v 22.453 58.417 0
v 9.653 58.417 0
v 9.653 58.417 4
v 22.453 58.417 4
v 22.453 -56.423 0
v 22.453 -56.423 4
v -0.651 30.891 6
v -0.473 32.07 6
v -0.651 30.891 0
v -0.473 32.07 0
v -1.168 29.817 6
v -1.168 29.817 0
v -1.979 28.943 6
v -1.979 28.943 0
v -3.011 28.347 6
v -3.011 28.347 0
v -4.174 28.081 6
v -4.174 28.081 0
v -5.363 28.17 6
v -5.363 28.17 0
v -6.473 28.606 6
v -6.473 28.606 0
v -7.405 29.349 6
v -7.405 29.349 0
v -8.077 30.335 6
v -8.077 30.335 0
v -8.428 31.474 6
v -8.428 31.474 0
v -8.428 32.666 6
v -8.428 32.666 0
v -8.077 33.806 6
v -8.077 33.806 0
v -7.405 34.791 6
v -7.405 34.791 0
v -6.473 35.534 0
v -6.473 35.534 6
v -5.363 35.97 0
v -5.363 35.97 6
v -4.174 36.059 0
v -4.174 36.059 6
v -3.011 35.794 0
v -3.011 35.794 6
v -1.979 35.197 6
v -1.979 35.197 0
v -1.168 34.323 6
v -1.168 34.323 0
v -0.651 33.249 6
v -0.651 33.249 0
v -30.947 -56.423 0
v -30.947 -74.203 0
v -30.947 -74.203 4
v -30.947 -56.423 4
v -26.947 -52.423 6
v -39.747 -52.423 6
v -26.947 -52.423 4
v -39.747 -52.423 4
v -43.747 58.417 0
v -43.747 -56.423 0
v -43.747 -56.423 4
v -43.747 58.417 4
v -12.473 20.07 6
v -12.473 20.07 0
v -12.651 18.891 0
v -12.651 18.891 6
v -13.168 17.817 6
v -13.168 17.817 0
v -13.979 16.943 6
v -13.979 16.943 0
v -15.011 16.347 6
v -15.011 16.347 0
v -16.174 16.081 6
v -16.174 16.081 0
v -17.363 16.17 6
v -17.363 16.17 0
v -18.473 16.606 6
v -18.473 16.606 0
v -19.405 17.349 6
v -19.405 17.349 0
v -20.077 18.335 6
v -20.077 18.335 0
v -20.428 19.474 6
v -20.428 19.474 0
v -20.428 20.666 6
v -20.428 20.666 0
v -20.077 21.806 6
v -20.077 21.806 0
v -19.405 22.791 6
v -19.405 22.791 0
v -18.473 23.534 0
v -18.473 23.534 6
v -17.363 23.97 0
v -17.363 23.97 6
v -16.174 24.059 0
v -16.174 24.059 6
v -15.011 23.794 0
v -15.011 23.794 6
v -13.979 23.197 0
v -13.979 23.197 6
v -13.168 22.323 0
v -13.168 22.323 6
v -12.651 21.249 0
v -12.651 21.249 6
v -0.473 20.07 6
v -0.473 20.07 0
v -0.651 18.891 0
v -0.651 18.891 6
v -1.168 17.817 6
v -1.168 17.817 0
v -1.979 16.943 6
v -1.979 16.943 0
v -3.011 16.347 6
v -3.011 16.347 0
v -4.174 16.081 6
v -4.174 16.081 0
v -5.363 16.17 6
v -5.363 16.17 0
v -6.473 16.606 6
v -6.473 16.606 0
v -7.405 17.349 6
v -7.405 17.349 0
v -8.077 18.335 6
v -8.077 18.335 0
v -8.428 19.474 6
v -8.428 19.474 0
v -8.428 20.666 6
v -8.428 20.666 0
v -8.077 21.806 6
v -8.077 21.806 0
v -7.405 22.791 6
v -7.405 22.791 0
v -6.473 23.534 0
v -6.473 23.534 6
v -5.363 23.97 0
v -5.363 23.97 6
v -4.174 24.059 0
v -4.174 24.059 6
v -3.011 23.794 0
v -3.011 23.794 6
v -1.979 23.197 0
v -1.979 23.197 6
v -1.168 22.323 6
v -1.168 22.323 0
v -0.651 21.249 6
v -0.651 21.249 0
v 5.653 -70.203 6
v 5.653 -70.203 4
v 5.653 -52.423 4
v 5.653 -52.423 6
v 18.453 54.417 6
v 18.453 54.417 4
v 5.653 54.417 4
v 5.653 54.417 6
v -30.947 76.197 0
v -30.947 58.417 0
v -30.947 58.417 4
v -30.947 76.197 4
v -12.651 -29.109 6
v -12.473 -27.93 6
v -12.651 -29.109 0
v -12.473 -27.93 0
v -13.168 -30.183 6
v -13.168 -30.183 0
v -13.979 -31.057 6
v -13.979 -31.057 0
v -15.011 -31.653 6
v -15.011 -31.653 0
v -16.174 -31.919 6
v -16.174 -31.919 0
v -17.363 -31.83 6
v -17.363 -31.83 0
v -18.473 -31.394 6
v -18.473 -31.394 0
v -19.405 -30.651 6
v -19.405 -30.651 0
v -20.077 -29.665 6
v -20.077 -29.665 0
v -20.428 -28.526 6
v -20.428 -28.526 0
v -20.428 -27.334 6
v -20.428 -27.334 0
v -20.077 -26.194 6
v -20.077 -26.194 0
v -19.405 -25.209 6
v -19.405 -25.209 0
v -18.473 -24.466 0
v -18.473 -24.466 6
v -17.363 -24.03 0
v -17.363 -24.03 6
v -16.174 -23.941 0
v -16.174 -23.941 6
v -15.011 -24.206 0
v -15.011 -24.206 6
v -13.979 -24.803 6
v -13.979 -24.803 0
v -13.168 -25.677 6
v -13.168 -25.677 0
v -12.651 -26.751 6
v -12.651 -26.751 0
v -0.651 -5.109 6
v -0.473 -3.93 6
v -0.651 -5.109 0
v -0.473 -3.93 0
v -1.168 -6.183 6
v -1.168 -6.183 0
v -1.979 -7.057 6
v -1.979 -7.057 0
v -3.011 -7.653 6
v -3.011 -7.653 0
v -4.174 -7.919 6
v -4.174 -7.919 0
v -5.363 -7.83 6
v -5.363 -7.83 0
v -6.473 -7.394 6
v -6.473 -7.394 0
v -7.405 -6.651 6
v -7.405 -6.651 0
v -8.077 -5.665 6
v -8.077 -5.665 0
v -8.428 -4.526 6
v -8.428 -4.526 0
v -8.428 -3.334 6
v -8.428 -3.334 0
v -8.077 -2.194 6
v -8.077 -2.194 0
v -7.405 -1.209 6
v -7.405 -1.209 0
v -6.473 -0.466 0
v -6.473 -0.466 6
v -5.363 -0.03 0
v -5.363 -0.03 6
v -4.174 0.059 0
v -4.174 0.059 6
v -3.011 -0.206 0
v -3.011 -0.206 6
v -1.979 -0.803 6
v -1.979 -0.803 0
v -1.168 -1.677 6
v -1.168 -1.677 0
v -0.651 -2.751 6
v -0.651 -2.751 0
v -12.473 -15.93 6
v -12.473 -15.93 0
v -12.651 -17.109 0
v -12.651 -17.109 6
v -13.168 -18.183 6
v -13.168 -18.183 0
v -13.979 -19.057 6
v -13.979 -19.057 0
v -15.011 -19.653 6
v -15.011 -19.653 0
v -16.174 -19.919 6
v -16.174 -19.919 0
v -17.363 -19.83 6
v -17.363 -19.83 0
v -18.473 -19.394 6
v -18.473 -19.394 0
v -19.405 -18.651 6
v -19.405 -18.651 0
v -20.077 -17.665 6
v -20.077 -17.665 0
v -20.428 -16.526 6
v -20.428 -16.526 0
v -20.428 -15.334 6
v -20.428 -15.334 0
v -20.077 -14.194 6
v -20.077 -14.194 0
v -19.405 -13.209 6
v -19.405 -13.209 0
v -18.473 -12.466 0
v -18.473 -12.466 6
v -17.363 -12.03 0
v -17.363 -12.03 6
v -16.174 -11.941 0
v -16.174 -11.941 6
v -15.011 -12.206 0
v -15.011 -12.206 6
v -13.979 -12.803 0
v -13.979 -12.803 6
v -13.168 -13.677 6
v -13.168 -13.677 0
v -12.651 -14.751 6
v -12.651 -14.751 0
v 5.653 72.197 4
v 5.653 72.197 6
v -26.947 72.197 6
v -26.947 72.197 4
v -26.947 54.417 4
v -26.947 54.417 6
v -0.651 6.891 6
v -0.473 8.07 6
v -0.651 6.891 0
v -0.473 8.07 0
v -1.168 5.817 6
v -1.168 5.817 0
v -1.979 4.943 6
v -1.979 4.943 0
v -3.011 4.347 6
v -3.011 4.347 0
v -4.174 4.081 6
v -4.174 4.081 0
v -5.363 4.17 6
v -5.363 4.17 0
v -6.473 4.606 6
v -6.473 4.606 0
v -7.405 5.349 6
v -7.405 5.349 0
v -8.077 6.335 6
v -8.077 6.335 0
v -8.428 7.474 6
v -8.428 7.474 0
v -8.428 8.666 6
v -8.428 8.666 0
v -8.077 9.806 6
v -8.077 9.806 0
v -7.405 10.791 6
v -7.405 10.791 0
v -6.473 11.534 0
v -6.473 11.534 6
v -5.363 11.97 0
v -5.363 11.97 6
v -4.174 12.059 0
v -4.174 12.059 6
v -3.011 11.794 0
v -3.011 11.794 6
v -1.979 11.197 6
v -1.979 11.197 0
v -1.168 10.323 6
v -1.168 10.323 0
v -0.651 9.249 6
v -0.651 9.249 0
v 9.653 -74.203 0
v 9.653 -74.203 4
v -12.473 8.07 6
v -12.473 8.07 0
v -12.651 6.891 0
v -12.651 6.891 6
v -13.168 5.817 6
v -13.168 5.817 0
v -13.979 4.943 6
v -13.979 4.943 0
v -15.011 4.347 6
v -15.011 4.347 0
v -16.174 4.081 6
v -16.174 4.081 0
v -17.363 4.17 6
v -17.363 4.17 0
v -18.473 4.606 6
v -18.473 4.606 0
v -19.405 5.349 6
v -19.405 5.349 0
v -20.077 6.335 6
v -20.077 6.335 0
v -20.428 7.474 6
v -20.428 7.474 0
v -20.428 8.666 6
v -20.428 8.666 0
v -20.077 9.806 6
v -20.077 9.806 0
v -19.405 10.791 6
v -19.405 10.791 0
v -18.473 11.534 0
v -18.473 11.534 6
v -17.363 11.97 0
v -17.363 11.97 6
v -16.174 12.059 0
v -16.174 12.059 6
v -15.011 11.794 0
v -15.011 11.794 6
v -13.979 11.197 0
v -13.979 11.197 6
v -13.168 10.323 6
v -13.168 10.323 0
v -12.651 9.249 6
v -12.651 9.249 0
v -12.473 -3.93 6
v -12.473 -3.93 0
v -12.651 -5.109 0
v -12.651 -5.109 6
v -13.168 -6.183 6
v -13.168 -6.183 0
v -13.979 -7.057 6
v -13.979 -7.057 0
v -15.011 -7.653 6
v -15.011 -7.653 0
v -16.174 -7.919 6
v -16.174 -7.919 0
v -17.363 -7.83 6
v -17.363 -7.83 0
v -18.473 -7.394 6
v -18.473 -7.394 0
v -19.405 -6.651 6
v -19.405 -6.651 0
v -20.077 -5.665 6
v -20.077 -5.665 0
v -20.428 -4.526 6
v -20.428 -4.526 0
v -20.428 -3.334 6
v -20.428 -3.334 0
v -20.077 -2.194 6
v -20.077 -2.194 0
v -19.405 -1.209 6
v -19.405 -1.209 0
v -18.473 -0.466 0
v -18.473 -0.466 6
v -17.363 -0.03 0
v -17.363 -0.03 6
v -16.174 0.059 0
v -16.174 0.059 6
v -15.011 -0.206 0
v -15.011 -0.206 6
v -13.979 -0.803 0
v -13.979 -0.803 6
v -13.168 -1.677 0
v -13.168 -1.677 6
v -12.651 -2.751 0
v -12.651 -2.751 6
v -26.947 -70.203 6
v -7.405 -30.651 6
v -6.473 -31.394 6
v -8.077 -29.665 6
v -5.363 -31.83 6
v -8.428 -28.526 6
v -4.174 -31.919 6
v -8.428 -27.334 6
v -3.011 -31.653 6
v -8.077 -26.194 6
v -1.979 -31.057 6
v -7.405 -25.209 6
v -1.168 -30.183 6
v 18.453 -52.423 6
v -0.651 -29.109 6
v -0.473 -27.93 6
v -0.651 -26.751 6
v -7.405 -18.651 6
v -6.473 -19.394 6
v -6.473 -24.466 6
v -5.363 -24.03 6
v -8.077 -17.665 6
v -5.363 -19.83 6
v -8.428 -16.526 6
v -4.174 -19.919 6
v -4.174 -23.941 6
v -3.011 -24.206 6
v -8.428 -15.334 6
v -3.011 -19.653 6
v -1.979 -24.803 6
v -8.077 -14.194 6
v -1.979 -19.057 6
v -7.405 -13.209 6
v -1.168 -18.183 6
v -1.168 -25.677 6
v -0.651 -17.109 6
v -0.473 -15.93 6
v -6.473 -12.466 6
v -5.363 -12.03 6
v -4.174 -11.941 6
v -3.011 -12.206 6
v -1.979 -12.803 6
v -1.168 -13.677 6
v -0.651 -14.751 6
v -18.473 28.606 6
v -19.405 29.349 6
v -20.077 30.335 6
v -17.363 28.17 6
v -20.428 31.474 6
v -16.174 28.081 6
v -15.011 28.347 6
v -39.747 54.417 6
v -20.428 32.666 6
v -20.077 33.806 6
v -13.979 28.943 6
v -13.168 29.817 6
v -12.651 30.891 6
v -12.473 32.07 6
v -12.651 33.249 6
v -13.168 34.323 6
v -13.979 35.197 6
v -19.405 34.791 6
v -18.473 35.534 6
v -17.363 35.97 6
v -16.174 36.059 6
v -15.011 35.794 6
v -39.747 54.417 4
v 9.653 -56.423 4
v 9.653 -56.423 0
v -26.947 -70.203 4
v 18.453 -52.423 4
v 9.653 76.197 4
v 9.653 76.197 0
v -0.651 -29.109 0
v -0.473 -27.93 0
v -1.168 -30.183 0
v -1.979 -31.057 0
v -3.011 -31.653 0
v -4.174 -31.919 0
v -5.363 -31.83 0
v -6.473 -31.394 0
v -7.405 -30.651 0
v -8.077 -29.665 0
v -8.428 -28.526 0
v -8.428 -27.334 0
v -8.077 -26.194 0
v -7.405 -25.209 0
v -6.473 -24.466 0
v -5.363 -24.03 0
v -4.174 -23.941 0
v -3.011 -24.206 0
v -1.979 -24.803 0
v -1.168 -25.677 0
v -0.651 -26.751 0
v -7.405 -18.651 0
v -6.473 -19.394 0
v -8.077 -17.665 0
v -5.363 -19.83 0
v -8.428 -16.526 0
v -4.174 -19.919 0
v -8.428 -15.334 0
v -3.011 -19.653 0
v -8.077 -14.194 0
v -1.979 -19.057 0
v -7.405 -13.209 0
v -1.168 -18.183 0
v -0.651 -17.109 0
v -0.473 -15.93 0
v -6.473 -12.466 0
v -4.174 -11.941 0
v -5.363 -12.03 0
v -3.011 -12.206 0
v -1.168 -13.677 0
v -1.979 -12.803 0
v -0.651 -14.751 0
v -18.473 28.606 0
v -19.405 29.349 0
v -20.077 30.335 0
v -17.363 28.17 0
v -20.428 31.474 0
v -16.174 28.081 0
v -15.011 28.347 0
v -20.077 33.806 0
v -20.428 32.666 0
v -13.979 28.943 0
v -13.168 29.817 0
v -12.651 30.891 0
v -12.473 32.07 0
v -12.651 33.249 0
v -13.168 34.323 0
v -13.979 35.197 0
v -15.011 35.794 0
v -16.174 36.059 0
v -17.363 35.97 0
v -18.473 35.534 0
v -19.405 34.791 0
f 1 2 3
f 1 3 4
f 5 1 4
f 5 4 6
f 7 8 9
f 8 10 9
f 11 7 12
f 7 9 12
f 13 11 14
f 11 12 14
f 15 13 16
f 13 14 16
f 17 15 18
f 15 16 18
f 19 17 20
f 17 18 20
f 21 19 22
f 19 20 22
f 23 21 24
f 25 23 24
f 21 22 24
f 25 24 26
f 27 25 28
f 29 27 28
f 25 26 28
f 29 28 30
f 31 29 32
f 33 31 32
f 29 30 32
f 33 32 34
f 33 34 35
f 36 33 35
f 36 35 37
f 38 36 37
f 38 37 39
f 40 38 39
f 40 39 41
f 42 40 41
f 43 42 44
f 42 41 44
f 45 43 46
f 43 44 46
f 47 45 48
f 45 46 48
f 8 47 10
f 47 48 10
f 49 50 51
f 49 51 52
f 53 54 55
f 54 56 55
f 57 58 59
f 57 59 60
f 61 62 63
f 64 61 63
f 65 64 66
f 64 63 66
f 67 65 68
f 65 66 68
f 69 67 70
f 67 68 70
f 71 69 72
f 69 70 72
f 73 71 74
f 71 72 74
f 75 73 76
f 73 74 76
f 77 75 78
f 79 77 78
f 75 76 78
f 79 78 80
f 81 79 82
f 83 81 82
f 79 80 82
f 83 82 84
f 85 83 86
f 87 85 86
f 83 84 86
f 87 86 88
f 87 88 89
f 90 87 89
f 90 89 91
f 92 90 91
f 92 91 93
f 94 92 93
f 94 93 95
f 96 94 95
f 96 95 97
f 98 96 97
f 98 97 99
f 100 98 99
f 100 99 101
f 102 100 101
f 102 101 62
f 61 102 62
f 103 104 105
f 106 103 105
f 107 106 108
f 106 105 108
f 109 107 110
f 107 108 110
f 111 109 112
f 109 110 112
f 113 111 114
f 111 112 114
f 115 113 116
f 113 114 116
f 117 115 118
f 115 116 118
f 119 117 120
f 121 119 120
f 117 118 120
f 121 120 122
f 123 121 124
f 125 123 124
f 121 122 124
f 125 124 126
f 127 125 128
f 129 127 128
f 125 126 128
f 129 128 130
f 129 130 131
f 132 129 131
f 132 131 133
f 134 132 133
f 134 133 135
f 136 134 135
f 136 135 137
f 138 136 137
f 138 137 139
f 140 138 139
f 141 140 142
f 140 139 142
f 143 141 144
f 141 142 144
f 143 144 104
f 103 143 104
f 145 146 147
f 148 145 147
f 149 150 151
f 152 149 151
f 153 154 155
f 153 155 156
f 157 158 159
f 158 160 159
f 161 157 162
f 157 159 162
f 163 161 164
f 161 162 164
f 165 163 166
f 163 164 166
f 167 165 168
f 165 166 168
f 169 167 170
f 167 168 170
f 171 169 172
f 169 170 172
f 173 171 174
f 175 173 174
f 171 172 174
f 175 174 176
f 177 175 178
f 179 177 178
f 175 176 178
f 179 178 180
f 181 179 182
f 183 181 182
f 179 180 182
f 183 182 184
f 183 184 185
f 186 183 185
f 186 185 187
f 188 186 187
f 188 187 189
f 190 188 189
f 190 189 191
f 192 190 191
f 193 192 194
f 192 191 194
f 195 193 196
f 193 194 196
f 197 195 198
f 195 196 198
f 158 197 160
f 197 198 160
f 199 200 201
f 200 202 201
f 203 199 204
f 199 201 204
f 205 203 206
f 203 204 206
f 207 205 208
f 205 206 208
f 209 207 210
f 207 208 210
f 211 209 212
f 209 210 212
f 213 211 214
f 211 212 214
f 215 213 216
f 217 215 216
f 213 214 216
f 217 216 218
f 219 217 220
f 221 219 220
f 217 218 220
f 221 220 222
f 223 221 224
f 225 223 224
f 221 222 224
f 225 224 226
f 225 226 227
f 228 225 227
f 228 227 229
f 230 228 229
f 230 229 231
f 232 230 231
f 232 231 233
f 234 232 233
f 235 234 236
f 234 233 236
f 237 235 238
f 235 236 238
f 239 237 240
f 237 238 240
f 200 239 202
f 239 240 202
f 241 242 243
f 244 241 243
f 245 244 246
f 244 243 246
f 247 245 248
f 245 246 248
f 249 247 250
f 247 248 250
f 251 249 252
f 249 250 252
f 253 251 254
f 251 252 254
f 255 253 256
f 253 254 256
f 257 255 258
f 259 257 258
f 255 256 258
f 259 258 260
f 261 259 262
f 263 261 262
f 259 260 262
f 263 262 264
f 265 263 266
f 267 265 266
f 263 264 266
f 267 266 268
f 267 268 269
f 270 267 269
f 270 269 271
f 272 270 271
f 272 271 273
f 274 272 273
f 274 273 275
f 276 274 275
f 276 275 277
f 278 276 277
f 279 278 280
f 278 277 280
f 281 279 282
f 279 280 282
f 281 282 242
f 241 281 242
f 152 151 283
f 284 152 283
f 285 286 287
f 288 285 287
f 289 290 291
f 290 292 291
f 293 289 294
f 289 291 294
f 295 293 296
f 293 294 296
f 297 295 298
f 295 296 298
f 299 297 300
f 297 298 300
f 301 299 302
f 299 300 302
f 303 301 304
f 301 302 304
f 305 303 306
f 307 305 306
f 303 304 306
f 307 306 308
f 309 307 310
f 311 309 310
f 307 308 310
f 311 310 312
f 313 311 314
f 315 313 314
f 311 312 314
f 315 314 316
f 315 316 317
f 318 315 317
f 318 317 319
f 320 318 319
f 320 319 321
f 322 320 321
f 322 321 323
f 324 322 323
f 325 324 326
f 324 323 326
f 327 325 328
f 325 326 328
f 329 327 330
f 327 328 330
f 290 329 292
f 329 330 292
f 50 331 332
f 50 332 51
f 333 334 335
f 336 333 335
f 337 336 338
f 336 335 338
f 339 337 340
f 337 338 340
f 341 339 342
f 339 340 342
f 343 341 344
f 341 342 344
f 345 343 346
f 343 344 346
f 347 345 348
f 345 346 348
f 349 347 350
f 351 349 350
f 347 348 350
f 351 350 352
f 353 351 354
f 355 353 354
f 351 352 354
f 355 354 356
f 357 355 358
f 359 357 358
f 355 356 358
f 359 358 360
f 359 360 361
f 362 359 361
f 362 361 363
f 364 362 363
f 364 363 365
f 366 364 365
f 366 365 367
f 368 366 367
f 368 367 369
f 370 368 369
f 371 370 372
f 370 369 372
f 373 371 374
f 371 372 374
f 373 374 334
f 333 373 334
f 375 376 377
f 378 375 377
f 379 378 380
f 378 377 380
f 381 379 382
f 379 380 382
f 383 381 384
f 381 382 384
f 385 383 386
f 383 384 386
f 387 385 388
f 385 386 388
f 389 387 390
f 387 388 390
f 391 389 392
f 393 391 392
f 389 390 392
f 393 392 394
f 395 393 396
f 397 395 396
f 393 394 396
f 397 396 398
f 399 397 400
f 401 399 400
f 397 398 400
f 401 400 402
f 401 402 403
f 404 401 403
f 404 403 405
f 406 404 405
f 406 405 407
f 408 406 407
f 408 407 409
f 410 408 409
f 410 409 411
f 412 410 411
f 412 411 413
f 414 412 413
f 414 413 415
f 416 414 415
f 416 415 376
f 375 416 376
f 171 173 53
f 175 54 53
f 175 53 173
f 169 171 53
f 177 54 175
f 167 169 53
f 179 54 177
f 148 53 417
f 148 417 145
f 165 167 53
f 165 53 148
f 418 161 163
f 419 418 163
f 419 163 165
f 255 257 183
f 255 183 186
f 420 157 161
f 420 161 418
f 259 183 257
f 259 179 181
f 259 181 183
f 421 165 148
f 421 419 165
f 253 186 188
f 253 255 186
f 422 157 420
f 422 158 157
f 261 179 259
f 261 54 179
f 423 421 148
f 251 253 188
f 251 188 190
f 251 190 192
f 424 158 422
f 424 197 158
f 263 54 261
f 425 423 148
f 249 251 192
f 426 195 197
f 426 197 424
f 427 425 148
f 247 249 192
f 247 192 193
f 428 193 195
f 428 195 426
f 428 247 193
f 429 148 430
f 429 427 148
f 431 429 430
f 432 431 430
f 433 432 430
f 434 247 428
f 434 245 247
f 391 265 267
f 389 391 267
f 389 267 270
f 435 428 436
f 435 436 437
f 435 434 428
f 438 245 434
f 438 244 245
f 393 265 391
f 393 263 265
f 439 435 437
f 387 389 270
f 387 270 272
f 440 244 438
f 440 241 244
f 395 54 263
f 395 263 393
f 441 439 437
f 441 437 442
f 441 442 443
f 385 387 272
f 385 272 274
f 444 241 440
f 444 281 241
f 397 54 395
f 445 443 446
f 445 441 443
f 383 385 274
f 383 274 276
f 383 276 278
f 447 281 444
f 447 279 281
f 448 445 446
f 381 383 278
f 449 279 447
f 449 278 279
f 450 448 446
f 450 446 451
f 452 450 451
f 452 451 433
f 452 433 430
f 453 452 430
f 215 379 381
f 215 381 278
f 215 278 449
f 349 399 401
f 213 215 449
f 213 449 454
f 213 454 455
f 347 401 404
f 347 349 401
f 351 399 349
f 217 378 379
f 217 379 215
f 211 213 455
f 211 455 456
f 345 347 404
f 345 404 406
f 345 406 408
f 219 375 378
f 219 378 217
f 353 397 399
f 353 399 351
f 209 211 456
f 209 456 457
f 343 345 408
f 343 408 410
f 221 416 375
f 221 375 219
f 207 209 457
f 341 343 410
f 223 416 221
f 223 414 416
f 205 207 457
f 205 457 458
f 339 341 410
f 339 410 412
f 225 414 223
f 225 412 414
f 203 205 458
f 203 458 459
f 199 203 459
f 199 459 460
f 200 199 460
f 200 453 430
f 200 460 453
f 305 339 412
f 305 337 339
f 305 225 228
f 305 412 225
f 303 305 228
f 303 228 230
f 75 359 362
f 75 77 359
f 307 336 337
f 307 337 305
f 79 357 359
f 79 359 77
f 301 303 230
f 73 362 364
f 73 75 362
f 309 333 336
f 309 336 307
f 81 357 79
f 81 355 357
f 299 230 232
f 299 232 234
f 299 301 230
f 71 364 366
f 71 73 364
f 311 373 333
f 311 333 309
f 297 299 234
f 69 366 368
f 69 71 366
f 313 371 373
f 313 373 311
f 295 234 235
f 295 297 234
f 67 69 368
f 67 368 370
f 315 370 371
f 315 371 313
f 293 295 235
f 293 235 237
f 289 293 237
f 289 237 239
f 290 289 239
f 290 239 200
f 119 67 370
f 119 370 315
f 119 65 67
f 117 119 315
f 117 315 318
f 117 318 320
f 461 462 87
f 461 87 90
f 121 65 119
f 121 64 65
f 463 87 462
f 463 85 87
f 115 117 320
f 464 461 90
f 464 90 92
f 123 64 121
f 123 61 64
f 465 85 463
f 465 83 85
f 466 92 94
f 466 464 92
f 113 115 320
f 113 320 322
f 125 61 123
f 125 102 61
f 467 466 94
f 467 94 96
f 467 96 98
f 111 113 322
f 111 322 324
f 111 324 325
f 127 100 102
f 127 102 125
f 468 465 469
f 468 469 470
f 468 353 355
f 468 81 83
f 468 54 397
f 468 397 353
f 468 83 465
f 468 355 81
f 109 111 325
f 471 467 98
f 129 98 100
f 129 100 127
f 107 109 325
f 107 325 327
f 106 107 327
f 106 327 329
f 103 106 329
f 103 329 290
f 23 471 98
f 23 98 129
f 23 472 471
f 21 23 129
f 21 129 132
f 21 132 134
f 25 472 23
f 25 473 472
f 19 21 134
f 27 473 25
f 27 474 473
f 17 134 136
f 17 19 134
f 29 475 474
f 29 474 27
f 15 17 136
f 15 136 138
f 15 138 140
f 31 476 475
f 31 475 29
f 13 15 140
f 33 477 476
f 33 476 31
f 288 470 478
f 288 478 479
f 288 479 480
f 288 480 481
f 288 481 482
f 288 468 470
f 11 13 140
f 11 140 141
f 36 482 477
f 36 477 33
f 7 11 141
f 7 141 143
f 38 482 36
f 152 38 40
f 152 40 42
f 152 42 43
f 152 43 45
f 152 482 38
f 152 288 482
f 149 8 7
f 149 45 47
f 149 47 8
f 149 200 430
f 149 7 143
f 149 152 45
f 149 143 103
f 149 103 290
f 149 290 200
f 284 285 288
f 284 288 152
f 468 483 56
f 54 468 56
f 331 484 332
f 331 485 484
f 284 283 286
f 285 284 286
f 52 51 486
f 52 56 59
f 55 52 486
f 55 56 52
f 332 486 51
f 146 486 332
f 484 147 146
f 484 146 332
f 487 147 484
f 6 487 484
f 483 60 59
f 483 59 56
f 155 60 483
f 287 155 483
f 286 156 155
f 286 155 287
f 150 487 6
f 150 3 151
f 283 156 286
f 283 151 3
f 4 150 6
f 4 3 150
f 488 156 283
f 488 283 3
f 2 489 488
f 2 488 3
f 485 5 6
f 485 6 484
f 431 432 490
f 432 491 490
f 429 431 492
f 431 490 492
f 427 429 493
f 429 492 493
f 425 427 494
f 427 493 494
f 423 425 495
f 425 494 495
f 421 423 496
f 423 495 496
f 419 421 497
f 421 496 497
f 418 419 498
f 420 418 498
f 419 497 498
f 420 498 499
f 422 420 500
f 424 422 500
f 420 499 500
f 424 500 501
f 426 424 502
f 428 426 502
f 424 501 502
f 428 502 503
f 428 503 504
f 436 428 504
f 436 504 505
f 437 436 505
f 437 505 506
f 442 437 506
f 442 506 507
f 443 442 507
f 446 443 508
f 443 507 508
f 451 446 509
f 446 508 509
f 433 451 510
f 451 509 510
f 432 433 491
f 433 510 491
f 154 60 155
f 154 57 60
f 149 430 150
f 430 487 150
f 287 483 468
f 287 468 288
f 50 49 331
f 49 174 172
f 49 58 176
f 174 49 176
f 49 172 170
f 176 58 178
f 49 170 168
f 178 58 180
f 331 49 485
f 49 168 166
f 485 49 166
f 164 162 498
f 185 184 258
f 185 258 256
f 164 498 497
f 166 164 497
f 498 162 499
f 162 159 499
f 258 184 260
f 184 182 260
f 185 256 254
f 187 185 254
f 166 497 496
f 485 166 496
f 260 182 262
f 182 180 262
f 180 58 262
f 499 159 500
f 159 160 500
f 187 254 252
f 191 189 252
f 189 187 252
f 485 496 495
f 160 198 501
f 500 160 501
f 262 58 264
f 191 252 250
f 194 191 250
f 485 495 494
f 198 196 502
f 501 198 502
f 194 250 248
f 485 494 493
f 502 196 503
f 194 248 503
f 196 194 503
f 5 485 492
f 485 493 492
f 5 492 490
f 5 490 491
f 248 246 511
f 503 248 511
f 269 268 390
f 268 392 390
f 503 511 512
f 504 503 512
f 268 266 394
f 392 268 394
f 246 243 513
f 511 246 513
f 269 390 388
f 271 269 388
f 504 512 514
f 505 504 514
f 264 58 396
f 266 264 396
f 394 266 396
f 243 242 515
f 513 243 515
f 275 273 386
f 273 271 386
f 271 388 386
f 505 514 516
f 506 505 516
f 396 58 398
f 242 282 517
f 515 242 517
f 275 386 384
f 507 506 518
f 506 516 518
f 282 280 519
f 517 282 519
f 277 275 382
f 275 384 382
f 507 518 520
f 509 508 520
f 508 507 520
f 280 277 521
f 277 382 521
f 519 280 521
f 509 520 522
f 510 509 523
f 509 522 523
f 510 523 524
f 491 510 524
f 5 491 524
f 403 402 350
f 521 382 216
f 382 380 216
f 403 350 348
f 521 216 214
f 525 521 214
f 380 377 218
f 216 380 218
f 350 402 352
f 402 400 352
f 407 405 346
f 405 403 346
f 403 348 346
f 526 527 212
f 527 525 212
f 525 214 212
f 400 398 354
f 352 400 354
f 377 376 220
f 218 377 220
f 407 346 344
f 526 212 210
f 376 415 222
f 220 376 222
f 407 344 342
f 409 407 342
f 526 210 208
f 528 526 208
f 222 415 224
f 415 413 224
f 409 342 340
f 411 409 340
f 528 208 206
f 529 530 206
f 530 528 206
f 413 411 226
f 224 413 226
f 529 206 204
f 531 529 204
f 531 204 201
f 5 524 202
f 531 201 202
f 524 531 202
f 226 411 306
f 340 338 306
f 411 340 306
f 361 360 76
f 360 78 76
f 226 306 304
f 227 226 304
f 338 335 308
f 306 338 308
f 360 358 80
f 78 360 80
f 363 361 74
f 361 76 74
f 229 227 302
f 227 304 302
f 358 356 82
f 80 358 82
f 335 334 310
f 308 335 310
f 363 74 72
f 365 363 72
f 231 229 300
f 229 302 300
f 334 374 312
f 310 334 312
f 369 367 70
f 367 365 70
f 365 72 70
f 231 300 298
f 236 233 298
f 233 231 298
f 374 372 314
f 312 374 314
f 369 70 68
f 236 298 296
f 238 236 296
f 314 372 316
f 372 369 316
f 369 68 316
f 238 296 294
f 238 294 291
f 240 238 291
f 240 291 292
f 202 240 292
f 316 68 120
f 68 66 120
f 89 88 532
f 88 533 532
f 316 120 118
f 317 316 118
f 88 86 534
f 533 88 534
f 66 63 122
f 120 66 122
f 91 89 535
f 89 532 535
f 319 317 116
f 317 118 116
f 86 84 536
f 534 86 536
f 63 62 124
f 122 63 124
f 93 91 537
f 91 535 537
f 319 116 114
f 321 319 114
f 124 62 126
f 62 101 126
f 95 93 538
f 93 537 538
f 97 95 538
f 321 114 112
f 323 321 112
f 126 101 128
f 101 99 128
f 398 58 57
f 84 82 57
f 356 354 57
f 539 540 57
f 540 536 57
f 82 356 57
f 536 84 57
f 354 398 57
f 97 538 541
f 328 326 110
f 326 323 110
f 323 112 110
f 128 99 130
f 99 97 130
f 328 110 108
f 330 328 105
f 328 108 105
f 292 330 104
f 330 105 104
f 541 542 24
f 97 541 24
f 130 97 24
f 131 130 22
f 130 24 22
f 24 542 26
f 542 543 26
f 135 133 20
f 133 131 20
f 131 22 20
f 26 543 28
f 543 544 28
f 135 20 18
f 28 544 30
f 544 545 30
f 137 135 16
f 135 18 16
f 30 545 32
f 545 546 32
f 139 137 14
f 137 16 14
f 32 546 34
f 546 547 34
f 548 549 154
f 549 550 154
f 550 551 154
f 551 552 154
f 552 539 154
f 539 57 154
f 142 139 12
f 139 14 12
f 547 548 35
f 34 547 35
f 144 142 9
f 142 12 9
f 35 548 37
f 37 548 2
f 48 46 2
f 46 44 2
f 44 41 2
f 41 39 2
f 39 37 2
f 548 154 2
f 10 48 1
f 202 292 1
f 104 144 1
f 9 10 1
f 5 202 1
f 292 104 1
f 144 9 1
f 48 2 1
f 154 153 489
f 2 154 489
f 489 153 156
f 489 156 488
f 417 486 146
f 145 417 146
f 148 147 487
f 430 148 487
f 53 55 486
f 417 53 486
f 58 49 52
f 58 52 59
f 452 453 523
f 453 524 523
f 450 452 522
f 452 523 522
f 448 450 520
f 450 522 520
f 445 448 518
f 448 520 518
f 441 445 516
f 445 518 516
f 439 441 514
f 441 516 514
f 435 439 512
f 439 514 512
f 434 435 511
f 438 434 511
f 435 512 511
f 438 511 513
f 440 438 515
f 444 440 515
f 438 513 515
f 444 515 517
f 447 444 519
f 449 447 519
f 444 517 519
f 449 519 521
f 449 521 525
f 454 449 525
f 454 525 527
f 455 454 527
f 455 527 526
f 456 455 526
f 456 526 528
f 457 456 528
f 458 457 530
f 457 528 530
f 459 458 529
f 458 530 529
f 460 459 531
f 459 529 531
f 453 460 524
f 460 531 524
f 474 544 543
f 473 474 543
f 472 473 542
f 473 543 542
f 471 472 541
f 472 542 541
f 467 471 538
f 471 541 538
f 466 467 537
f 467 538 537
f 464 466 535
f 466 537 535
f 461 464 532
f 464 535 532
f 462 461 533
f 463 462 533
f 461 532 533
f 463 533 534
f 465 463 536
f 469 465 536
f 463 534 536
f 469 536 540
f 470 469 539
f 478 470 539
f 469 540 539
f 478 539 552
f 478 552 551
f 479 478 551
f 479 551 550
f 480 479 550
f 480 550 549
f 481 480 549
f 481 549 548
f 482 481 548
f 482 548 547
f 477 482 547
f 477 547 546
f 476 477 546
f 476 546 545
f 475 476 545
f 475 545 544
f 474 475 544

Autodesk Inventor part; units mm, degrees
ref_plane "YZ Plane" through (0, 0, 0) normal (1, 0, 0) x (0, 1, 0)
ref_plane "XZ Plane" through (0, 0, 0) normal (0, 1, 0) x (-1, 0, 0)
ref_plane "XY Plane" through (0, 0, 0) normal (0, 0, 1) x (1, 0, 0)
sketch "Sketch1" plane through (0, 0, 0) normal (0, 0, 1) x (1, 0, 0)
  line L0 (-39.7468, 54.4174) -> (-39.7468, -52.4226)
  line L1 (-39.7468, -52.4226) -> (-26.9468, -52.4226)
  line L2 (-26.9468, -52.4226) -> (-26.9468, -70.2026)
  line L3 (-26.9468, -70.2026) -> (5.6532, -70.2026)
  line L4 (5.6532, -70.2026) -> (5.6532, -52.4226)
  line L5 (5.6532, -52.4226) -> (18.4532, -52.4226)
  line L6 (18.4532, -52.4226) -> (18.4532, 54.4174)
  line L7 (18.4532, 54.4174) -> (5.6532, 54.4174)
  line L8 (5.6532, 54.4174) -> (5.6532, 72.1974)
  line L9 (5.6532, 72.1974) -> (-26.9468, 72.1974)
  line L10 (-26.9468, 72.1974) -> (-26.9468, 54.4174)
  line L11 (-39.7468, 54.4174) -> (-26.9468, 54.4174)
  line L12 (-23.8279, 76.1974) -> (9.6532, 76.1974)
  line L13 (9.6532, 76.1974) -> (9.6532, 58.4174)
  line L14 (9.6532, 58.4174) -> (22.4532, 58.4174)
  line L15 (22.4532, 58.4174) -> (22.4532, -56.4226)
  line L16 (22.4532, -56.4226) -> (9.6532, -56.4226)
  line L17 (9.6532, -56.4226) -> (9.6532, -74.2026)
  line L18 (9.6532, -74.2026) -> (-30.9468, -74.2026)
  line L19 (-30.9468, -74.2026) -> (-30.9468, -56.4226)
  line L20 (-30.9468, -56.4226) -> (-43.7468, -56.4226)
  line L21 (-43.7468, -56.4226) -> (-43.7468, 58.4174)
  line L22 (-43.7468, 58.4174) -> (-30.9468, 58.4174)
  line L23 (-30.9468, 76.1974) -> (-23.8279, 76.1974)
  line L24 (-30.9468, 58.4174) -> (-30.9468, 76.1974)
  point P0 (0, 0)
  dimension "d0" = 106.84
  dimension "d1" = 142.4
  dimension "d2" = 17.78
  dimension "d3" = 17.78
  dimension "d4" = 32.6
  dimension "d5" = 12.8
  dimension "d6" = 12.8
  dimension "d7" = 4
  dimension "d8" = 4
  dimension "d9" = 4
  dimension "d10" = 4
  dimension "d11" = 4
  dimension "d12" = 4
  dimension "d13" = 4
  dimension "d14" = 4
  dimension "d15" = 4
sketch "Sketch2" plane through (0, 0, 0) normal (0, 0, 1) x (1, 0, 0)
  circle A0 centre (-4.4728, 32.0701) radius 4
  circle A1 centre (-16.4728, 32.0701) radius 4
  circle A2 centre (-4.4728, 20.0701) radius 4
  circle A3 centre (-16.4728, 20.0701) radius 4
  circle A4 centre (-4.4728, 8.0701) radius 4
  circle A5 centre (-16.4728, 8.0701) radius 4
  circle A6 centre (-4.4728, -3.9299) radius 4
  circle A7 centre (-16.4728, -15.9299) radius 4
  circle A8 centre (-4.4728, -15.9299) radius 4
  circle A9 centre (-16.4728, -3.9299) radius 4
  circle A10 centre (-4.4728, -27.9299) radius 4
  circle A11 centre (-16.4728, -27.9299) radius 4
  point P0 (0, 0)
  dimension "d22" = 8
  dimension "d27" = 8
  dimension "d30" = 8
  dimension "d34" = 8
  dimension "d38" = 8
  dimension "d42" = 8
  dimension "d59" = 12
  dimension "d63" = 12
  dimension "d67" = 12
  dimension "d70" = 12
  dimension "d71" = 12
  dimension "d75" = 12
  dimension "d93" = 12
  dimension "d94" = 0
  dimension "d97" = 0
  dimension "d98" = 12
  dimension "d102" = 0
  dimension "d103" = 12
extrude "Extrusion1" add sketch "Sketch1" along normal blind 6 contours L11 L10 L9 L8 L7 L6 L5 L4 L3 L2 L1 L0
extrude "Extrusion2" add sketch "Sketch1" along normal blind 4
extrude "Extrusion3" cut sketch "Sketch2" along normal blind 12
properties part number "rib"
